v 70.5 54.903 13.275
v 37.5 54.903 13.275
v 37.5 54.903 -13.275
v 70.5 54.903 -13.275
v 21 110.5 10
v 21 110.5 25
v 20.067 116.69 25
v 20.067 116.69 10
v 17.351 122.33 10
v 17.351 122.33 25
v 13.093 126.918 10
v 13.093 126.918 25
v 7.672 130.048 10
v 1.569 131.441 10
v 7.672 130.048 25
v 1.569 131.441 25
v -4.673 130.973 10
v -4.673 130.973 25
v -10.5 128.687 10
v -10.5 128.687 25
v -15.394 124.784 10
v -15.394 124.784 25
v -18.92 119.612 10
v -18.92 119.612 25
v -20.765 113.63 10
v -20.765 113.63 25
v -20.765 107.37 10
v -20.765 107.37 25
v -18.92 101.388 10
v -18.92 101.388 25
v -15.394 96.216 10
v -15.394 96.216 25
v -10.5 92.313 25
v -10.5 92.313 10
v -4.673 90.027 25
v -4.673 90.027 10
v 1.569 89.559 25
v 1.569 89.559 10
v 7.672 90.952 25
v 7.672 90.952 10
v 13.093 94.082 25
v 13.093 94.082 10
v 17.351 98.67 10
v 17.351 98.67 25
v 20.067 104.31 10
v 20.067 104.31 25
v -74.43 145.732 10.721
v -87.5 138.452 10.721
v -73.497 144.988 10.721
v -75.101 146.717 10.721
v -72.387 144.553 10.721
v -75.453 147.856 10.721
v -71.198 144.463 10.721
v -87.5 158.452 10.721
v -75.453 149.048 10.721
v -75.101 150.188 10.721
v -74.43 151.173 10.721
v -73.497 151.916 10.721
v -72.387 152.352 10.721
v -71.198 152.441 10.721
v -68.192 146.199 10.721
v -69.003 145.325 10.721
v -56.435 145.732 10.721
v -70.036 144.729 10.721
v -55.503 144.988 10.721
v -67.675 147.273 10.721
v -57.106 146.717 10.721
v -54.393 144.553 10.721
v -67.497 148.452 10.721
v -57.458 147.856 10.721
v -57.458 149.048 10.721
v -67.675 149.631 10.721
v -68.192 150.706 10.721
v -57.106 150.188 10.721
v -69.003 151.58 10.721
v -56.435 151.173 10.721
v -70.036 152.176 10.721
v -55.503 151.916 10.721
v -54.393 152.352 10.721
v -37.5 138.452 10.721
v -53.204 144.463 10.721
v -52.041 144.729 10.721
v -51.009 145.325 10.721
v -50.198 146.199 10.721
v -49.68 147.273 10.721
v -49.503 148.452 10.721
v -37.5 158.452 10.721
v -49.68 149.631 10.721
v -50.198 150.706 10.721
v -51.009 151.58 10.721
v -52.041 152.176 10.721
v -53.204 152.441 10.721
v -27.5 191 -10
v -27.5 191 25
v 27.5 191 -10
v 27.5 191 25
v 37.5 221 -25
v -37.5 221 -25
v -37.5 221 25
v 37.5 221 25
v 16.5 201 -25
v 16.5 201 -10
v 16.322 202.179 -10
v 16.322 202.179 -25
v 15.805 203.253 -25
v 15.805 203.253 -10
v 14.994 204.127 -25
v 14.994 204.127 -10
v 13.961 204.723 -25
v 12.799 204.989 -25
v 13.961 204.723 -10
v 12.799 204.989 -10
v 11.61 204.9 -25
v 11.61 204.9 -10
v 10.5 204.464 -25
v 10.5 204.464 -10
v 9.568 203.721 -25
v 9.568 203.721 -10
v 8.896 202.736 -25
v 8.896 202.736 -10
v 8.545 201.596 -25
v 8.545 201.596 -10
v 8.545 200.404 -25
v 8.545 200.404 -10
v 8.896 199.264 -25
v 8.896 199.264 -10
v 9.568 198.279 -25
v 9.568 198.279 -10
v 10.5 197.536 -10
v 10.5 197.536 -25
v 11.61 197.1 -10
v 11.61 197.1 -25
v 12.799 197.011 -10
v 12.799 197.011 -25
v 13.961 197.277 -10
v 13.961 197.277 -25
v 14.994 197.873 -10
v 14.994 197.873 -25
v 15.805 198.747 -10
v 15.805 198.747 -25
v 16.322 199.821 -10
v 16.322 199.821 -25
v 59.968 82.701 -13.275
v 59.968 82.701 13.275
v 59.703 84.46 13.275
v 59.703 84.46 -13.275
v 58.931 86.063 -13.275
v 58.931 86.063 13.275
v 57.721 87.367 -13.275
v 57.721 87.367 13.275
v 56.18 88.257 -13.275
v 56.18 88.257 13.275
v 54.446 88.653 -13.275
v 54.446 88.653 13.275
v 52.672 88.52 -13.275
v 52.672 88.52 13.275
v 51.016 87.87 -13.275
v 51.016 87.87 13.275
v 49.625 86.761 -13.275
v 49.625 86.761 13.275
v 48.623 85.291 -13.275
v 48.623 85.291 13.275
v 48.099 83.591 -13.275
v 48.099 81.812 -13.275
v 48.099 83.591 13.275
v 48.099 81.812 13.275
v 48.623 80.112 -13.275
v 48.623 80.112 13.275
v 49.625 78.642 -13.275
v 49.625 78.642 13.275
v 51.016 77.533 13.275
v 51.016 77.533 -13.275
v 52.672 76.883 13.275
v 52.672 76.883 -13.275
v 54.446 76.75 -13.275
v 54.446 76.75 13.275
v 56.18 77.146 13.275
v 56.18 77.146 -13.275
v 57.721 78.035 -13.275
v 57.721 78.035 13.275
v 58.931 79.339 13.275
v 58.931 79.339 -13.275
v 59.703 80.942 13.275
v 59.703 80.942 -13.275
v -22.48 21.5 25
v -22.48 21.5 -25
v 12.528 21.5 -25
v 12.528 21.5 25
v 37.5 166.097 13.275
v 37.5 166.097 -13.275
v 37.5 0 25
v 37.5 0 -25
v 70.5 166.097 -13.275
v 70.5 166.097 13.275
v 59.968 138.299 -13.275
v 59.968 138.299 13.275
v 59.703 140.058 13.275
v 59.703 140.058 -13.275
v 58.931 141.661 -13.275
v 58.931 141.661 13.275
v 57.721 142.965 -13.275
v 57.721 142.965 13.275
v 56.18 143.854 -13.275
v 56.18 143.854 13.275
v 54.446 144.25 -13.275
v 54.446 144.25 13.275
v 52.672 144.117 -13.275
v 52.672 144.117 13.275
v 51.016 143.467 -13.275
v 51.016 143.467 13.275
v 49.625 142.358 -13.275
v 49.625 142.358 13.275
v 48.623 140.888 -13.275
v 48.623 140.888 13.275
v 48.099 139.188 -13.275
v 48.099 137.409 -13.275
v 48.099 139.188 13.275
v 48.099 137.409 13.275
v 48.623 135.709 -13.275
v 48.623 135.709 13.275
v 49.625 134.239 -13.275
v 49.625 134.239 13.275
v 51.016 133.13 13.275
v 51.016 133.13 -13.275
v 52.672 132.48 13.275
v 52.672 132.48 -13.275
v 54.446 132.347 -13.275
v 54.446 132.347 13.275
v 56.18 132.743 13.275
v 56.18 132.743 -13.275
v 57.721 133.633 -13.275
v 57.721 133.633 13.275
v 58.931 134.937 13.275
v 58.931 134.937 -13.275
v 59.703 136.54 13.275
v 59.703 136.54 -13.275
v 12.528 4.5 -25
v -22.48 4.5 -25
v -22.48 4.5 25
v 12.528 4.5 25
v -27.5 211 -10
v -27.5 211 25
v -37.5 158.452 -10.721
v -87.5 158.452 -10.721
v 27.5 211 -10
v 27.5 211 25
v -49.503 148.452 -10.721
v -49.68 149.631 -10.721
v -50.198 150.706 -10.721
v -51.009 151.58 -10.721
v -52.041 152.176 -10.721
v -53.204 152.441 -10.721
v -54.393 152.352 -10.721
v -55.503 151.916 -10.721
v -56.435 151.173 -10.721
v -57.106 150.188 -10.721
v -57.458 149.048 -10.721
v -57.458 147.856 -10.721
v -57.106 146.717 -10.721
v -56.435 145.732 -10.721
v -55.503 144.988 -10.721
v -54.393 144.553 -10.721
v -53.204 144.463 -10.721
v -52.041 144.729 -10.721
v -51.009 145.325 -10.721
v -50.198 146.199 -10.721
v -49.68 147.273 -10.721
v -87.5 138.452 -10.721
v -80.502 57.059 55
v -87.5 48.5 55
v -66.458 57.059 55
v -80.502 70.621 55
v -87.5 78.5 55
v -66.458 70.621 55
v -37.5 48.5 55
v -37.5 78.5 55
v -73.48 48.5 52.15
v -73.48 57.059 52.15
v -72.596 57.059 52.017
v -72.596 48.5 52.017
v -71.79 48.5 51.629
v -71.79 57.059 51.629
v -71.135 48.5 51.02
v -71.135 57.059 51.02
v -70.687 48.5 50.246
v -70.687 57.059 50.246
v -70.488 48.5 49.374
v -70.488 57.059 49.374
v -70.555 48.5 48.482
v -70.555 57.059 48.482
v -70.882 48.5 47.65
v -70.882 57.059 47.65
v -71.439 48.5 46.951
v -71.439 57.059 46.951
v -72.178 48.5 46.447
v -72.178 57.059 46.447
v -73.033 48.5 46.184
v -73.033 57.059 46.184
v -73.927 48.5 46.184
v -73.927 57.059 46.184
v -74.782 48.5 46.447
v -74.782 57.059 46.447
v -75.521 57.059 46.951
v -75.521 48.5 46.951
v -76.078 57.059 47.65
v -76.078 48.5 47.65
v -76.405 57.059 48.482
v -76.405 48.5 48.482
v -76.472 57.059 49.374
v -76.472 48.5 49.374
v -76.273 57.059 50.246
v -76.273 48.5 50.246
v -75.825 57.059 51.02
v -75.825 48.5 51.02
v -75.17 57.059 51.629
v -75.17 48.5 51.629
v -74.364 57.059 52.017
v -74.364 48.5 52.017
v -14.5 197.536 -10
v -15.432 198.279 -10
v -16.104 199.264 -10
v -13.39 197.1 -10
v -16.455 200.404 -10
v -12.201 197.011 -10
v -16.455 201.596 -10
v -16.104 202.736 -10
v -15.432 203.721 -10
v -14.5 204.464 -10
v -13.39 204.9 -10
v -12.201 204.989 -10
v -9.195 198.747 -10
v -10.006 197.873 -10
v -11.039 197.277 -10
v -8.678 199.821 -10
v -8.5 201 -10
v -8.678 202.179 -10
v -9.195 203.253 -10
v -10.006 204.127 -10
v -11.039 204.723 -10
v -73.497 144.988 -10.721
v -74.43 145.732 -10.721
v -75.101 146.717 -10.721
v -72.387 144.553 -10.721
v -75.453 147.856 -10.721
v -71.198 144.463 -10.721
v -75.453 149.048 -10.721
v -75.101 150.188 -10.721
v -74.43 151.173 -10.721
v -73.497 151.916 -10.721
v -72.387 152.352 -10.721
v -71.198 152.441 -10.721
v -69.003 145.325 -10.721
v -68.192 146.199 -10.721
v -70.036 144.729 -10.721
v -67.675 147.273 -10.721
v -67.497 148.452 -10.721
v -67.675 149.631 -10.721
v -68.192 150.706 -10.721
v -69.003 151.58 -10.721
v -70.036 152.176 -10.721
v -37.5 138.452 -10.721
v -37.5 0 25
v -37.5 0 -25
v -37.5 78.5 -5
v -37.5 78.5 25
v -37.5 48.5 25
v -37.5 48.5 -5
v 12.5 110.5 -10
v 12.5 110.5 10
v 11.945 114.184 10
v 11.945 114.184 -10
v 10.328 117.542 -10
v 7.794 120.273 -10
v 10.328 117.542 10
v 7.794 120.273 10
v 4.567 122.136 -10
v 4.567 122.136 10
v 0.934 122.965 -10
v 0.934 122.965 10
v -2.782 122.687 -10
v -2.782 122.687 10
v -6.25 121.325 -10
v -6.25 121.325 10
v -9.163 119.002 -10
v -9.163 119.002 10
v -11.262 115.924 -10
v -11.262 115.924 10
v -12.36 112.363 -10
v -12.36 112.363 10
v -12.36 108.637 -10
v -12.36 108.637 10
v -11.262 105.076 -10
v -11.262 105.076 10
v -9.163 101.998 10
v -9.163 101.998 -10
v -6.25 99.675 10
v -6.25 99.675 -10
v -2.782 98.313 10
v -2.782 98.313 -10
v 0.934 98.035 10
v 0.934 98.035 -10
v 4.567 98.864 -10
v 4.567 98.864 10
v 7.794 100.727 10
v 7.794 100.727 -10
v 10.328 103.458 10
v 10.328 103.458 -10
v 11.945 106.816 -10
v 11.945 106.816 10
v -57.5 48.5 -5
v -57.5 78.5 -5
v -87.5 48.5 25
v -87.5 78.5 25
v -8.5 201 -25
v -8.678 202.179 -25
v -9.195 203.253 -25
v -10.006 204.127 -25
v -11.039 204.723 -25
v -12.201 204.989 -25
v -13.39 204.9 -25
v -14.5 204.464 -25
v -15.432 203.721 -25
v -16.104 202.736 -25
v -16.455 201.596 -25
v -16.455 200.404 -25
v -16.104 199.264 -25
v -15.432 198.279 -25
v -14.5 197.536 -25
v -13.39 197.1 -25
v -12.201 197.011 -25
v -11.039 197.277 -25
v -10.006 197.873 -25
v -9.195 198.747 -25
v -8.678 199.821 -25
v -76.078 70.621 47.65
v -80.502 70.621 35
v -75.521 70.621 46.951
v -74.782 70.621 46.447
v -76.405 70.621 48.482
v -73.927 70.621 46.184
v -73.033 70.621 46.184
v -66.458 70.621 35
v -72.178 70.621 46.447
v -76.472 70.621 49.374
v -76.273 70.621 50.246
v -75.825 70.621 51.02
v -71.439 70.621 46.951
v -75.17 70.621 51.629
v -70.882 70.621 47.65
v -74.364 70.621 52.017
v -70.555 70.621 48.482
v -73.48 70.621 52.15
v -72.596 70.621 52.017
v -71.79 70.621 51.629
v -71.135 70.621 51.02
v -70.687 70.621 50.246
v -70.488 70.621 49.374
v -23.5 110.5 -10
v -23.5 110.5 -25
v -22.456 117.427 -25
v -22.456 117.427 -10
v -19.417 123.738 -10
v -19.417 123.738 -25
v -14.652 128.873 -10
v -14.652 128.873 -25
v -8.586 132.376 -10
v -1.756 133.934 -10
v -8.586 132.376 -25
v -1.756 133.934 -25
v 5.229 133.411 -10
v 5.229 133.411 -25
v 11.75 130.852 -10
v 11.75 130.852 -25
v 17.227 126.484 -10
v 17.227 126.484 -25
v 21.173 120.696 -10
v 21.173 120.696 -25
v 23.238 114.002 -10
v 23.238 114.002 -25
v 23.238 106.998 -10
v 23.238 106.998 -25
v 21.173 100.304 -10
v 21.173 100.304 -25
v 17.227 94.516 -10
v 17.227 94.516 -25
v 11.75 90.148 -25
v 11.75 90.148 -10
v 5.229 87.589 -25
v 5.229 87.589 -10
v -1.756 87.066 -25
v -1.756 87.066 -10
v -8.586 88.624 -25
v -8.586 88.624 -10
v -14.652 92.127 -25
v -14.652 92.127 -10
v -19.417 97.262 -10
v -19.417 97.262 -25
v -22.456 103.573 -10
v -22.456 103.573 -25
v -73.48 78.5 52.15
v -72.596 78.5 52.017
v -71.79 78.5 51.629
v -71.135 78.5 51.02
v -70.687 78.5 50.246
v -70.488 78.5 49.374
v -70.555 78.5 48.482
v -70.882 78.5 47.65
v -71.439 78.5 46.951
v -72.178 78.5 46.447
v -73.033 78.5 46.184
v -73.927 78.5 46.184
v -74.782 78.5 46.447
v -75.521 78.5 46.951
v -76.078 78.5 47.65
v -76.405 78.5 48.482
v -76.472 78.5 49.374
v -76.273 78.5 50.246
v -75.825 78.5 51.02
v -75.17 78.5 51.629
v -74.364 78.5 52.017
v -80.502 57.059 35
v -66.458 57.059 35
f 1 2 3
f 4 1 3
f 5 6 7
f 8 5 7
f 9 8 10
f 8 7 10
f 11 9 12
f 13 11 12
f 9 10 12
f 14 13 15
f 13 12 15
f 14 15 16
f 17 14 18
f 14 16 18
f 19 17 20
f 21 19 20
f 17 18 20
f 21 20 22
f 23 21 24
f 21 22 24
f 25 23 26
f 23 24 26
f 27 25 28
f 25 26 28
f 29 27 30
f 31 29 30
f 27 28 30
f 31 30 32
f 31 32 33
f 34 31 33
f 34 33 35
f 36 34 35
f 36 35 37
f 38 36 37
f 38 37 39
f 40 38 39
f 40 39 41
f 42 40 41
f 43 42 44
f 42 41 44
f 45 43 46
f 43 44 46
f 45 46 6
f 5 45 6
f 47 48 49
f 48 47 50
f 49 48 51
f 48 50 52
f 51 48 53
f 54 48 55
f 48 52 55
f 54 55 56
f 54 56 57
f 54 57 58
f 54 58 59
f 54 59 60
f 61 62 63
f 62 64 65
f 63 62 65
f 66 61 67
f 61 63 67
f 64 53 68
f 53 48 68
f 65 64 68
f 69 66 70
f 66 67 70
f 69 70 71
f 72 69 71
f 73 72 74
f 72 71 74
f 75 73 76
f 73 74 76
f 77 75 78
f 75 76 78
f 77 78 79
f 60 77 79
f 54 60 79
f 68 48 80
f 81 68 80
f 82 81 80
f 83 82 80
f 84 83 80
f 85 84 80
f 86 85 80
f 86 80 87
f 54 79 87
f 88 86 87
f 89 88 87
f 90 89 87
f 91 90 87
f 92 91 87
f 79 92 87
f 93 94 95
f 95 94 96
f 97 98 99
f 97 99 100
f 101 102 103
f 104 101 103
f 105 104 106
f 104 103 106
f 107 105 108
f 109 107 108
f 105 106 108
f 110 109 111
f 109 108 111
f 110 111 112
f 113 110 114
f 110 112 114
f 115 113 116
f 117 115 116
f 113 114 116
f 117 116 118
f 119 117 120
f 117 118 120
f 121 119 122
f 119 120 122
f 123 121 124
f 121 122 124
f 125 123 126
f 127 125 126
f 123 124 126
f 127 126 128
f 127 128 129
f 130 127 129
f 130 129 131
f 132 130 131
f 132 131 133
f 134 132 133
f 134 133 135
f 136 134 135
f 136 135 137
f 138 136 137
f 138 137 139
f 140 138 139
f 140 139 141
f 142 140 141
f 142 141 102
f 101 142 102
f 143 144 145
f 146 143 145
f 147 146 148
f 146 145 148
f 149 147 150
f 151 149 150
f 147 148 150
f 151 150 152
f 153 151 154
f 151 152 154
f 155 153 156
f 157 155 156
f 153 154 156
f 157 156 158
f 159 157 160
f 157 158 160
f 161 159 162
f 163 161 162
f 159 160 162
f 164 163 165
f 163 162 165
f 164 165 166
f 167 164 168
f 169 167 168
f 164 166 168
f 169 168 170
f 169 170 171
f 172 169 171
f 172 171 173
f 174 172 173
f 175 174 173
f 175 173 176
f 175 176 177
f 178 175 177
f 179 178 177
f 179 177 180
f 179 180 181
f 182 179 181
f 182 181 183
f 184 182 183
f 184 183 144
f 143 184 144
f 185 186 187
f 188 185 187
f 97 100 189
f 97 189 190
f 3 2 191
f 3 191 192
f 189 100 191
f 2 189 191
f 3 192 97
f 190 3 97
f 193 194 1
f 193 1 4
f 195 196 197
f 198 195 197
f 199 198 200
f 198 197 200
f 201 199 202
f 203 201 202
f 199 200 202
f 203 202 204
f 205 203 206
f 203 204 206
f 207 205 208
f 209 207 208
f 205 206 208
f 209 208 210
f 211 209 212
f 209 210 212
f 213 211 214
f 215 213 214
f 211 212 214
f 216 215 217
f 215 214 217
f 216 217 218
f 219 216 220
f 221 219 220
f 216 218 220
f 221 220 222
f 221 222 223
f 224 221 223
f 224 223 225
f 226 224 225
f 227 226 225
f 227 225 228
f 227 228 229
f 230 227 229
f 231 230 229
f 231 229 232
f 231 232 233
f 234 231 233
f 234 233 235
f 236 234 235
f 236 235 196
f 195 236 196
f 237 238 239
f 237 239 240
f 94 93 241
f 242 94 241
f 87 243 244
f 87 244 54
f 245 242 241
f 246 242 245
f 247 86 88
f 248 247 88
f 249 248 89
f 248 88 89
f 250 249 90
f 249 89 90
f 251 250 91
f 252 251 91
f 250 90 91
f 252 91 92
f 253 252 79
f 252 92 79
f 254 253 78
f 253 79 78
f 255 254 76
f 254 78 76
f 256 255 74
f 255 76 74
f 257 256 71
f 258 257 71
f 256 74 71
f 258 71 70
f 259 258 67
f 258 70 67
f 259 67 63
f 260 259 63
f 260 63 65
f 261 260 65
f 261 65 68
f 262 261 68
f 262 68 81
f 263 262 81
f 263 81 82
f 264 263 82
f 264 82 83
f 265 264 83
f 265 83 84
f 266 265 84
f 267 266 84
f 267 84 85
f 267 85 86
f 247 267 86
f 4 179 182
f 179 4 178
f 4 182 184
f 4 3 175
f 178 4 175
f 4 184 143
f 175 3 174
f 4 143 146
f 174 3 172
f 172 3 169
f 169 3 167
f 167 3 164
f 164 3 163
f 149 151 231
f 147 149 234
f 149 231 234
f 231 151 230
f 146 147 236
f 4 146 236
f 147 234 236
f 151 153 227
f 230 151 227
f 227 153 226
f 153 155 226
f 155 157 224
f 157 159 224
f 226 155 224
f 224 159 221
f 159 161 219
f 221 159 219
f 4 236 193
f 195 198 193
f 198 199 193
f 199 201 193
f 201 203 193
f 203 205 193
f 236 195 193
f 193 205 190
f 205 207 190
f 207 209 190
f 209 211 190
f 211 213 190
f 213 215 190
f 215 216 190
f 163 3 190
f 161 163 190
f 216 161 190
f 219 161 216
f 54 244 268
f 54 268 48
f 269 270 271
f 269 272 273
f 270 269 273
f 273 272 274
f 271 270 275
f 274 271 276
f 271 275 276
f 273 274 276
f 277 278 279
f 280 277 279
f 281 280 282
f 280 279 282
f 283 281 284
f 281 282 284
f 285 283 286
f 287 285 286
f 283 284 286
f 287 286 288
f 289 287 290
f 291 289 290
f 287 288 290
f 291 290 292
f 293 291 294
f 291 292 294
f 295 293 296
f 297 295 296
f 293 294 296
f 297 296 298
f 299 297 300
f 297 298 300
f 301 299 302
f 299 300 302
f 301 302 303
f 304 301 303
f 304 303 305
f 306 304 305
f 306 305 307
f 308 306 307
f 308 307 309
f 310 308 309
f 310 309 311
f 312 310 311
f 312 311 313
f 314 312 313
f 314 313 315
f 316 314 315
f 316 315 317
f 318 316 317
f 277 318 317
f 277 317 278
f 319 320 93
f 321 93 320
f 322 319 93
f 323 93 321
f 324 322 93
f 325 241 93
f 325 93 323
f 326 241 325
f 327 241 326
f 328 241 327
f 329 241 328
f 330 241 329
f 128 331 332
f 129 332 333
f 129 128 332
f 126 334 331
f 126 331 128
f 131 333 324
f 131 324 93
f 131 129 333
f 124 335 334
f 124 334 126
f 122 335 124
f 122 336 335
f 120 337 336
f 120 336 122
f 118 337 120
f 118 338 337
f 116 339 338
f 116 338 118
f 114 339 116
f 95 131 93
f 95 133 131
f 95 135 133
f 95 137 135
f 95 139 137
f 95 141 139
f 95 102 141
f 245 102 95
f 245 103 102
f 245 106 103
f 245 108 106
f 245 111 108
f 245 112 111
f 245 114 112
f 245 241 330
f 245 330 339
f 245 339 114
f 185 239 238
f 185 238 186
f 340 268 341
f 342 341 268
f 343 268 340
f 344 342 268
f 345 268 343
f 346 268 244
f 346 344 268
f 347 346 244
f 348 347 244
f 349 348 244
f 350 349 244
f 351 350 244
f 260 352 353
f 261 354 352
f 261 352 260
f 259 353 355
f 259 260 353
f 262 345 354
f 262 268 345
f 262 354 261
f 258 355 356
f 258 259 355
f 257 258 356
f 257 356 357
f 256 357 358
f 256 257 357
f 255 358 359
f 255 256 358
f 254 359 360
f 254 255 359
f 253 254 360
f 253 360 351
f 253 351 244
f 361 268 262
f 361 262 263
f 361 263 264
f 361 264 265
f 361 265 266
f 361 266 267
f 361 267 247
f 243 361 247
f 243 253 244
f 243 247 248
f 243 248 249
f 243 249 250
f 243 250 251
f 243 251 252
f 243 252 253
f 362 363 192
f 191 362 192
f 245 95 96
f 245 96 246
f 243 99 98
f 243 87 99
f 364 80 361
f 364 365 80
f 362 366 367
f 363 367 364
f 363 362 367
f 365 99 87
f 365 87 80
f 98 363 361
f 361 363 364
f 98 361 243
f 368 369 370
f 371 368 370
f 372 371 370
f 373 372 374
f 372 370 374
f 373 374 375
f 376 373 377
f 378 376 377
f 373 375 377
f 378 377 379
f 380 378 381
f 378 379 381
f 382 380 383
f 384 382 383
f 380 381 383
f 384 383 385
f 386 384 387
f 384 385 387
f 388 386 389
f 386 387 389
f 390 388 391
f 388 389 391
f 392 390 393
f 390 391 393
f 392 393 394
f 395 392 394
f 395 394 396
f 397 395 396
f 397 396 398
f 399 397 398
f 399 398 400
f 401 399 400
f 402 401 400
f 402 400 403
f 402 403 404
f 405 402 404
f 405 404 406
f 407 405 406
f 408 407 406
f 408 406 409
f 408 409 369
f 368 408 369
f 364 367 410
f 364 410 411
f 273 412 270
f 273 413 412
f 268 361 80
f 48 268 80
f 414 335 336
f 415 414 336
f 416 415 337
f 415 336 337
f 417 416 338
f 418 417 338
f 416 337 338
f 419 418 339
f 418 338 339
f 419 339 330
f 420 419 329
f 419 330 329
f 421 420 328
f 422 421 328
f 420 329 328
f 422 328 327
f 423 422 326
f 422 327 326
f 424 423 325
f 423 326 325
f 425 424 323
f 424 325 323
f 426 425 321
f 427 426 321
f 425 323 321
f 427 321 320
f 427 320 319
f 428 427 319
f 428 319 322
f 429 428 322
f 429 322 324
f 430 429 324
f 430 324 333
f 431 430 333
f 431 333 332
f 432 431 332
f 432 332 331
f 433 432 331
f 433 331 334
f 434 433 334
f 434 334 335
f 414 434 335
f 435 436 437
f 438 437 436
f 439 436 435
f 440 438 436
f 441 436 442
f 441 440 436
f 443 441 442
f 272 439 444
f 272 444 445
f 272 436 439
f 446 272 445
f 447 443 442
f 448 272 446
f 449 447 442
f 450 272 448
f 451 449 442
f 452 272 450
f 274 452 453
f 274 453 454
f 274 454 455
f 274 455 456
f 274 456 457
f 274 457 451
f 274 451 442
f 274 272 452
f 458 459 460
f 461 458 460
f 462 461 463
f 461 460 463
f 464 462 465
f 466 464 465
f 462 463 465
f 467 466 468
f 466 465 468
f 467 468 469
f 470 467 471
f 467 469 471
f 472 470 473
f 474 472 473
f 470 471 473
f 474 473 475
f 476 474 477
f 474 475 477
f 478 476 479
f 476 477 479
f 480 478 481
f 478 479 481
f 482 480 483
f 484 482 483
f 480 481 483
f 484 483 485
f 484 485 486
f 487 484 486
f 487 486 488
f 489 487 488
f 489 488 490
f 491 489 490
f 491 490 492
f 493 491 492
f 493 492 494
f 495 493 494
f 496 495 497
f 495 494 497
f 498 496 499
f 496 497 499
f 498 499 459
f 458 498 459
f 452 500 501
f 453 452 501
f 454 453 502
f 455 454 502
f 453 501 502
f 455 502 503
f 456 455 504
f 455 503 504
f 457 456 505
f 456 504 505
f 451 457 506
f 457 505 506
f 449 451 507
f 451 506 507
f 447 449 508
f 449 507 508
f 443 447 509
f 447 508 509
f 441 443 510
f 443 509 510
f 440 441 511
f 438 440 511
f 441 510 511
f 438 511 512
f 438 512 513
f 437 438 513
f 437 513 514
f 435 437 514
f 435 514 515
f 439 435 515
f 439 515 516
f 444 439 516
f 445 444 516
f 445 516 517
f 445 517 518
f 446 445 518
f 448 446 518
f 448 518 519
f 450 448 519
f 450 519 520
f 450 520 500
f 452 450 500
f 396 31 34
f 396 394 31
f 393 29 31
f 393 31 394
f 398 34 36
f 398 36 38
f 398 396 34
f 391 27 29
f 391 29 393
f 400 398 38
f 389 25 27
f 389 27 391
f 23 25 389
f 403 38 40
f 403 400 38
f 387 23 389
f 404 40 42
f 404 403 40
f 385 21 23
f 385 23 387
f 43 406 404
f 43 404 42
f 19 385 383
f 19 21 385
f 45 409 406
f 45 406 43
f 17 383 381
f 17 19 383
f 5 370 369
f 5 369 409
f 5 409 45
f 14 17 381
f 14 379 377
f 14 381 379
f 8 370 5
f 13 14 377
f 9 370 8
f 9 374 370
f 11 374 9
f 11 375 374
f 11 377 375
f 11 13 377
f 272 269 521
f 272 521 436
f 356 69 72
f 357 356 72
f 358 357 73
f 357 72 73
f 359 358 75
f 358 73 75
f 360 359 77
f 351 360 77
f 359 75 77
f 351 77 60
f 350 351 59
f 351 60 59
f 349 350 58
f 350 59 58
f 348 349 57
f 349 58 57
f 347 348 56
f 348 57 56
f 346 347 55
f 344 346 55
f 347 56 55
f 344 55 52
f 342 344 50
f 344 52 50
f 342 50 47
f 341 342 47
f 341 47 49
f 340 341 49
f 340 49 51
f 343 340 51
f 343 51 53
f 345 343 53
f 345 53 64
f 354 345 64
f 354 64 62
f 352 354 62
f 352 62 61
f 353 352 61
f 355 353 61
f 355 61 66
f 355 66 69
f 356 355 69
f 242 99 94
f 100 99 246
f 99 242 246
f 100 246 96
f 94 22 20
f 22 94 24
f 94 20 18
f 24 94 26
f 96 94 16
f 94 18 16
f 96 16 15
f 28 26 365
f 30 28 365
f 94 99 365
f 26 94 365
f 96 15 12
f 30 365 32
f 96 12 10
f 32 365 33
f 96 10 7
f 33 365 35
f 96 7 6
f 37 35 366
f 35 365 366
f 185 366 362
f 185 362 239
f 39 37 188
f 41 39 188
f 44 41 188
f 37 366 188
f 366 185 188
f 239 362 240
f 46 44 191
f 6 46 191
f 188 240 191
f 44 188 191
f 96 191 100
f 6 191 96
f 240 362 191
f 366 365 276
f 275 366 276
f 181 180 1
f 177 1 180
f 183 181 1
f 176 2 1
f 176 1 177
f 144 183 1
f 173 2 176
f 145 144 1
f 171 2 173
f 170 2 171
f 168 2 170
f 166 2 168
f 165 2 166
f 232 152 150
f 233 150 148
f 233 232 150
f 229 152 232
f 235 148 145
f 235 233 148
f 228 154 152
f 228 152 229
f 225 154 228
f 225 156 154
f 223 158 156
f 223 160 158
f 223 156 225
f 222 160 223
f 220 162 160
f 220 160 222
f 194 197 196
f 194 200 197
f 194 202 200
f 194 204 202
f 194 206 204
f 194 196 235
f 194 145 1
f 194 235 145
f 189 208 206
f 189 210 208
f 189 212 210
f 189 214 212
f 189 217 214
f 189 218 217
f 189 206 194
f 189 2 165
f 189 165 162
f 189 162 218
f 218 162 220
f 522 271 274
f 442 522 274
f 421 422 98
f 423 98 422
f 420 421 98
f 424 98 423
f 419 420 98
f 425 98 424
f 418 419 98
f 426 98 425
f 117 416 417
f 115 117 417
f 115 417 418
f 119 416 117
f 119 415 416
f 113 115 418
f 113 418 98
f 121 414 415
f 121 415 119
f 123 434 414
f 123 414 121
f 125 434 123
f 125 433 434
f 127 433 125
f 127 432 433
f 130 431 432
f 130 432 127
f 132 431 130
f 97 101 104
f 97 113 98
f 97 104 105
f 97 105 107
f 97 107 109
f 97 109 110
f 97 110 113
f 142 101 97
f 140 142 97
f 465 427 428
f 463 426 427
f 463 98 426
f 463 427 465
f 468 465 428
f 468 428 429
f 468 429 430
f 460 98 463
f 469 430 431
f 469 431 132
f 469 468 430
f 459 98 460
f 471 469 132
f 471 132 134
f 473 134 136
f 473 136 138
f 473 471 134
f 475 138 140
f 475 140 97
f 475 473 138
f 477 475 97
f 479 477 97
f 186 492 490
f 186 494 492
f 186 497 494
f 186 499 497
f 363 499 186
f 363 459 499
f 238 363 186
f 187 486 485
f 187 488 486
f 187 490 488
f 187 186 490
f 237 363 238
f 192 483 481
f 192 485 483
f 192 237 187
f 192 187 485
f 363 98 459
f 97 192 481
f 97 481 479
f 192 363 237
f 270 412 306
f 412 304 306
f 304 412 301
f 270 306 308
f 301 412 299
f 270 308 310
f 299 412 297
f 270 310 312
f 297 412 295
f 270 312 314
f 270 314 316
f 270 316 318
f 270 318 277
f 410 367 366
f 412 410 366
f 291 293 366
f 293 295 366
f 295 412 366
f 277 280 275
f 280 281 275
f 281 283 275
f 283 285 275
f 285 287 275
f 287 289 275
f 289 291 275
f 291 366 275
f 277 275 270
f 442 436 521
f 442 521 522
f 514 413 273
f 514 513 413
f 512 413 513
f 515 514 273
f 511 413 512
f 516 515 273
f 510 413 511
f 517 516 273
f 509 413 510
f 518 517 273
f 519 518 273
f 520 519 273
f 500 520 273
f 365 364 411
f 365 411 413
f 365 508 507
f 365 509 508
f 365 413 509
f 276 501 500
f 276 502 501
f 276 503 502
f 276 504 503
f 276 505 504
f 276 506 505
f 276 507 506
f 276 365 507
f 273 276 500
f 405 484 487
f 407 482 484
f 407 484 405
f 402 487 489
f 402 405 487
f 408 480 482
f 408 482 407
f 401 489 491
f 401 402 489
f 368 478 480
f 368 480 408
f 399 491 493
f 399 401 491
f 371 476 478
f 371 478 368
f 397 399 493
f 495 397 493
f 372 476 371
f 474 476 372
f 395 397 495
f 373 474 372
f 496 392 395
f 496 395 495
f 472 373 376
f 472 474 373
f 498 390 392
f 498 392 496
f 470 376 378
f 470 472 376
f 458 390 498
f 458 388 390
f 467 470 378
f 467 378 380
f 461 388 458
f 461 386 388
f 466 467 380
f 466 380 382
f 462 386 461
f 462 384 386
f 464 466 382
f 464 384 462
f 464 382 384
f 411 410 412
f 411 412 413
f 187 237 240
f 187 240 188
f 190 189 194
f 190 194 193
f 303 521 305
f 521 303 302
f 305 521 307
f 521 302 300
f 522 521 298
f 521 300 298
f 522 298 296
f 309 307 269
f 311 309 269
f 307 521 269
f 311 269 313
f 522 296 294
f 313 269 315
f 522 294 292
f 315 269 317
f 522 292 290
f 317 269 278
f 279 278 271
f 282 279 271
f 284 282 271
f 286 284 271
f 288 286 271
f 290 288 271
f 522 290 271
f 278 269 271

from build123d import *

# Parameters (mm, degrees)
SKETCH1_W                         = 75
SKETCH1_H                         = 50
BE_MAIN_UPRIGHT_BODY_DEPTH        = 221
SKETCH4_R                         = 12.5
CE_THROUGH_HOLE_DEPTH             = 230.667694724
SKETCH2_R                         = 21
CE_INNER_BEARING_DEPTH            = 15
SKETCH3_R                         = 23.5
CE_OUTER_BEARING_DEPTH            = 15
SKETCH7_W                         = 26.55070312
SKETCH7_H                         = 111.194580496
BE_CALIPER_MOUNT_DEPTH            = 33
SKETCH8_W                         = 21.441072272
SKETCH8_H                         = 20
BE_TEMP_SENSOR_MOUNT_DEPTH        = 50
SKETCH9_W                         = 60
SKETCH9_H                         = 30
BE_TIE_ROD_MOUNT_DEPTH            = 50
SKETCH10_R                        = 5.968024458
CE_CALIPER_HOLES_DEPTH            = 242.325913005
SKETCH12_R                        = 4
CE_TOP_CLEVIS_HOLES_DEPTH         = 243.893495178
SKETCH13_W                        = 55
SKETCH13_H                        = 20
CE_TOP_CLEVIS_SPACE_DEPTH         = 35
SKETCH14_W                        = 25
SKETCH14_H                        = 12
CE_BOTTOM_CLEVIS_SPACE_DEPTH      = 243.893495178
SKETCH15_W                        = 25
SKETCH15_H                        = 5
CE_EXPAND_BOTTOM_CLEVIS_DEPTH     = 243.893495178
CE_WIDEN_BOTTOM_CLEVIS_DEPTH      = 240.74121548
CE_WIDEN_BOTTOM_CLEVIS_DEPTH_BACK = 240.74121548
SKETCH16_W                        = 10.007554032
SKETCH16_H                        = 17
CHAMFER1_SIZE                     = 30
SKETCH18_W                        = 14.04398123
SKETCH18_H                        = 13.562779604
CUT_EXTRUDE1_DEPTH                = 20
SKETCH19_R                        = 3
CUT_EXTRUDE2_DEPTH                = 177.032667423
SKETCH20_R                        = 4
CUT_EXTRUDE3_DEPTH                = 242.780729009


with BuildPart() as part:
    # Sketch1 → BE - main upright body (new body)
    with BuildSketch(Plane(origin=(0, 0, 0), x_dir=(1, 0, 0), z_dir=(0, 1, 0))):
        Rectangle(SKETCH1_W, SKETCH1_H)
    extrude(amount=BE_MAIN_UPRIGHT_BODY_DEPTH)

    # Sketch4 → CE - Through hole (cut, through all)
    with BuildSketch(Plane.XY.offset(25)):
        with Locations((0, 110.5)):
            Circle(SKETCH4_R)
    extrude(amount=-CE_THROUGH_HOLE_DEPTH, mode=Mode.SUBTRACT)

    # Sketch2 → CE - Inner bearing (cut)
    with BuildSketch(Plane.XY.offset(25)):
        with Locations((0, 110.5)):
            Circle(SKETCH2_R)
    extrude(amount=-CE_INNER_BEARING_DEPTH, mode=Mode.SUBTRACT)

    # Sketch3 → CE - Outer bearing (cut)
    with BuildSketch(Plane(origin=(0, 0, -25), x_dir=(-1, 0, 0), z_dir=(0, 0, -1))):
        with Locations((0, 110.5)):
            Circle(SKETCH3_R)
    extrude(amount=-CE_OUTER_BEARING_DEPTH, mode=Mode.SUBTRACT)

    # Sketch7 → BE - caliper mount (add)
    with BuildSketch(Plane(origin=(37.5, 0, 0), x_dir=(0, 0, -1), z_dir=(1, 0, 0))):
        with Locations((0, 110.5)):
            Rectangle(SKETCH7_W, SKETCH7_H)
    extrude(amount=BE_CALIPER_MOUNT_DEPTH)

    # Sketch8 → BE - temp sensor mount (add)
    with BuildSketch(Plane.ZY.offset(37.5)):
        with Locations((0, 148.452249223)):
            Rectangle(SKETCH8_W, SKETCH8_H)
    extrude(amount=BE_TEMP_SENSOR_MOUNT_DEPTH)

    # Sketch9 → BE - tie rod mount (add)
    with BuildSketch(Plane.ZY.offset(37.5)):
        with Locations((25, 63.5)):
            Rectangle(SKETCH9_W, SKETCH9_H)
    extrude(amount=BE_TIE_ROD_MOUNT_DEPTH)

    # Sketch10 → CE - caliper holes (cut, through all)
    with BuildSketch(Plane.XY.offset(13.27535156)):
        with Locations((54, 138.298645124)):
            Circle(SKETCH10_R)
        with Locations((54, 82.701354876)):
            Circle(SKETCH10_R)
    extrude(amount=-CE_CALIPER_HOLES_DEPTH, mode=Mode.SUBTRACT)

    # Sketch12 → CE - top clevis holes (cut, through all)
    with BuildSketch(Plane.XY.offset(25)):
        with Locations((-12.5, 201)):
            Circle(SKETCH12_R)
        with Locations((12.5, 201)):
            Circle(SKETCH12_R)
    extrude(amount=-CE_TOP_CLEVIS_HOLES_DEPTH, mode=Mode.SUBTRACT)

    # Sketch13 → CE - top clevis space (cut)
    with BuildSketch(Plane.XY.offset(25)):
        with Locations((0, 201)):
            Rectangle(SKETCH13_W, SKETCH13_H)
    extrude(amount=-CE_TOP_CLEVIS_SPACE_DEPTH, mode=Mode.SUBTRACT)

    # Sketch14 → CE - bottom clevis space (cut, through all)
    with BuildSketch(Plane.XY.offset(25)):
        with Locations((-9.98, 10.5)):
            Rectangle(SKETCH14_W, SKETCH14_H)
    extrude(amount=-CE_BOTTOM_CLEVIS_SPACE_DEPTH, mode=Mode.SUBTRACT)

    # Sketch15 → CE - expand bottom clevis (cut, through all)
    with BuildSketch(Plane.XY.offset(25)):
        with Locations((-9.98, 19)):
            Rectangle(SKETCH15_W, SKETCH15_H)
    extrude(amount=-CE_EXPAND_BOTTOM_CLEVIS_DEPTH, mode=Mode.SUBTRACT)

    # Sketch16 → CE - widen bottom clevis (cut, two sides: drawn at the far end of the back side and taken through both)
    with BuildSketch(Plane(origin=(2.52, 4.5, 25), x_dir=(1, 0, 0), z_dir=(0, 0, 1)).offset(-CE_WIDEN_BOTTOM_CLEVIS_DEPTH_BACK)):
        with Locations((5.003777016, 8.5)):
            Rectangle(SKETCH16_W, SKETCH16_H)
    extrude(amount=CE_WIDEN_BOTTOM_CLEVIS_DEPTH + CE_WIDEN_BOTTOM_CLEVIS_DEPTH_BACK, mode=Mode.SUBTRACT)

    # Chamfer1
    chamfer1_edges = [part.edges().sort_by_distance(p)[0] for p in [
        (-87.5, 63.5, -5),
    ]]
    chamfer(chamfer1_edges, length=CHAMFER1_SIZE)

    # Sketch18 → Cut-Extrude1 (cut)
    with BuildSketch(Plane.XY.offset(55)):
        with Locations((-73.48, 63.84)):
            Rectangle(SKETCH18_W, SKETCH18_H)
    extrude(amount=-CUT_EXTRUDE1_DEPTH, mode=Mode.SUBTRACT)

    # Sketch19 → Cut-Extrude2 (cut, through all)
    with BuildSketch(Plane(origin=(0, 78.5, 0), x_dir=(1, 0, 0), z_dir=(0, 1, 0))):
        with Locations(Location((-73.48, -49.15, 0), (0, 0, 270))):
            Circle(SKETCH19_R)
    extrude(amount=-CUT_EXTRUDE2_DEPTH, mode=Mode.SUBTRACT)

    # Sketch20 → Cut-Extrude3 (cut, through all)
    with BuildSketch(Plane.XY.offset(10.720536136)):
        with Locations((-53.502606246, 148.452249223)):
            Circle(SKETCH20_R)
        with Locations((-71.497393754, 148.452249223)):
            Circle(SKETCH20_R)
    extrude(amount=-CUT_EXTRUDE3_DEPTH, mode=Mode.SUBTRACT)


solid = part.part
